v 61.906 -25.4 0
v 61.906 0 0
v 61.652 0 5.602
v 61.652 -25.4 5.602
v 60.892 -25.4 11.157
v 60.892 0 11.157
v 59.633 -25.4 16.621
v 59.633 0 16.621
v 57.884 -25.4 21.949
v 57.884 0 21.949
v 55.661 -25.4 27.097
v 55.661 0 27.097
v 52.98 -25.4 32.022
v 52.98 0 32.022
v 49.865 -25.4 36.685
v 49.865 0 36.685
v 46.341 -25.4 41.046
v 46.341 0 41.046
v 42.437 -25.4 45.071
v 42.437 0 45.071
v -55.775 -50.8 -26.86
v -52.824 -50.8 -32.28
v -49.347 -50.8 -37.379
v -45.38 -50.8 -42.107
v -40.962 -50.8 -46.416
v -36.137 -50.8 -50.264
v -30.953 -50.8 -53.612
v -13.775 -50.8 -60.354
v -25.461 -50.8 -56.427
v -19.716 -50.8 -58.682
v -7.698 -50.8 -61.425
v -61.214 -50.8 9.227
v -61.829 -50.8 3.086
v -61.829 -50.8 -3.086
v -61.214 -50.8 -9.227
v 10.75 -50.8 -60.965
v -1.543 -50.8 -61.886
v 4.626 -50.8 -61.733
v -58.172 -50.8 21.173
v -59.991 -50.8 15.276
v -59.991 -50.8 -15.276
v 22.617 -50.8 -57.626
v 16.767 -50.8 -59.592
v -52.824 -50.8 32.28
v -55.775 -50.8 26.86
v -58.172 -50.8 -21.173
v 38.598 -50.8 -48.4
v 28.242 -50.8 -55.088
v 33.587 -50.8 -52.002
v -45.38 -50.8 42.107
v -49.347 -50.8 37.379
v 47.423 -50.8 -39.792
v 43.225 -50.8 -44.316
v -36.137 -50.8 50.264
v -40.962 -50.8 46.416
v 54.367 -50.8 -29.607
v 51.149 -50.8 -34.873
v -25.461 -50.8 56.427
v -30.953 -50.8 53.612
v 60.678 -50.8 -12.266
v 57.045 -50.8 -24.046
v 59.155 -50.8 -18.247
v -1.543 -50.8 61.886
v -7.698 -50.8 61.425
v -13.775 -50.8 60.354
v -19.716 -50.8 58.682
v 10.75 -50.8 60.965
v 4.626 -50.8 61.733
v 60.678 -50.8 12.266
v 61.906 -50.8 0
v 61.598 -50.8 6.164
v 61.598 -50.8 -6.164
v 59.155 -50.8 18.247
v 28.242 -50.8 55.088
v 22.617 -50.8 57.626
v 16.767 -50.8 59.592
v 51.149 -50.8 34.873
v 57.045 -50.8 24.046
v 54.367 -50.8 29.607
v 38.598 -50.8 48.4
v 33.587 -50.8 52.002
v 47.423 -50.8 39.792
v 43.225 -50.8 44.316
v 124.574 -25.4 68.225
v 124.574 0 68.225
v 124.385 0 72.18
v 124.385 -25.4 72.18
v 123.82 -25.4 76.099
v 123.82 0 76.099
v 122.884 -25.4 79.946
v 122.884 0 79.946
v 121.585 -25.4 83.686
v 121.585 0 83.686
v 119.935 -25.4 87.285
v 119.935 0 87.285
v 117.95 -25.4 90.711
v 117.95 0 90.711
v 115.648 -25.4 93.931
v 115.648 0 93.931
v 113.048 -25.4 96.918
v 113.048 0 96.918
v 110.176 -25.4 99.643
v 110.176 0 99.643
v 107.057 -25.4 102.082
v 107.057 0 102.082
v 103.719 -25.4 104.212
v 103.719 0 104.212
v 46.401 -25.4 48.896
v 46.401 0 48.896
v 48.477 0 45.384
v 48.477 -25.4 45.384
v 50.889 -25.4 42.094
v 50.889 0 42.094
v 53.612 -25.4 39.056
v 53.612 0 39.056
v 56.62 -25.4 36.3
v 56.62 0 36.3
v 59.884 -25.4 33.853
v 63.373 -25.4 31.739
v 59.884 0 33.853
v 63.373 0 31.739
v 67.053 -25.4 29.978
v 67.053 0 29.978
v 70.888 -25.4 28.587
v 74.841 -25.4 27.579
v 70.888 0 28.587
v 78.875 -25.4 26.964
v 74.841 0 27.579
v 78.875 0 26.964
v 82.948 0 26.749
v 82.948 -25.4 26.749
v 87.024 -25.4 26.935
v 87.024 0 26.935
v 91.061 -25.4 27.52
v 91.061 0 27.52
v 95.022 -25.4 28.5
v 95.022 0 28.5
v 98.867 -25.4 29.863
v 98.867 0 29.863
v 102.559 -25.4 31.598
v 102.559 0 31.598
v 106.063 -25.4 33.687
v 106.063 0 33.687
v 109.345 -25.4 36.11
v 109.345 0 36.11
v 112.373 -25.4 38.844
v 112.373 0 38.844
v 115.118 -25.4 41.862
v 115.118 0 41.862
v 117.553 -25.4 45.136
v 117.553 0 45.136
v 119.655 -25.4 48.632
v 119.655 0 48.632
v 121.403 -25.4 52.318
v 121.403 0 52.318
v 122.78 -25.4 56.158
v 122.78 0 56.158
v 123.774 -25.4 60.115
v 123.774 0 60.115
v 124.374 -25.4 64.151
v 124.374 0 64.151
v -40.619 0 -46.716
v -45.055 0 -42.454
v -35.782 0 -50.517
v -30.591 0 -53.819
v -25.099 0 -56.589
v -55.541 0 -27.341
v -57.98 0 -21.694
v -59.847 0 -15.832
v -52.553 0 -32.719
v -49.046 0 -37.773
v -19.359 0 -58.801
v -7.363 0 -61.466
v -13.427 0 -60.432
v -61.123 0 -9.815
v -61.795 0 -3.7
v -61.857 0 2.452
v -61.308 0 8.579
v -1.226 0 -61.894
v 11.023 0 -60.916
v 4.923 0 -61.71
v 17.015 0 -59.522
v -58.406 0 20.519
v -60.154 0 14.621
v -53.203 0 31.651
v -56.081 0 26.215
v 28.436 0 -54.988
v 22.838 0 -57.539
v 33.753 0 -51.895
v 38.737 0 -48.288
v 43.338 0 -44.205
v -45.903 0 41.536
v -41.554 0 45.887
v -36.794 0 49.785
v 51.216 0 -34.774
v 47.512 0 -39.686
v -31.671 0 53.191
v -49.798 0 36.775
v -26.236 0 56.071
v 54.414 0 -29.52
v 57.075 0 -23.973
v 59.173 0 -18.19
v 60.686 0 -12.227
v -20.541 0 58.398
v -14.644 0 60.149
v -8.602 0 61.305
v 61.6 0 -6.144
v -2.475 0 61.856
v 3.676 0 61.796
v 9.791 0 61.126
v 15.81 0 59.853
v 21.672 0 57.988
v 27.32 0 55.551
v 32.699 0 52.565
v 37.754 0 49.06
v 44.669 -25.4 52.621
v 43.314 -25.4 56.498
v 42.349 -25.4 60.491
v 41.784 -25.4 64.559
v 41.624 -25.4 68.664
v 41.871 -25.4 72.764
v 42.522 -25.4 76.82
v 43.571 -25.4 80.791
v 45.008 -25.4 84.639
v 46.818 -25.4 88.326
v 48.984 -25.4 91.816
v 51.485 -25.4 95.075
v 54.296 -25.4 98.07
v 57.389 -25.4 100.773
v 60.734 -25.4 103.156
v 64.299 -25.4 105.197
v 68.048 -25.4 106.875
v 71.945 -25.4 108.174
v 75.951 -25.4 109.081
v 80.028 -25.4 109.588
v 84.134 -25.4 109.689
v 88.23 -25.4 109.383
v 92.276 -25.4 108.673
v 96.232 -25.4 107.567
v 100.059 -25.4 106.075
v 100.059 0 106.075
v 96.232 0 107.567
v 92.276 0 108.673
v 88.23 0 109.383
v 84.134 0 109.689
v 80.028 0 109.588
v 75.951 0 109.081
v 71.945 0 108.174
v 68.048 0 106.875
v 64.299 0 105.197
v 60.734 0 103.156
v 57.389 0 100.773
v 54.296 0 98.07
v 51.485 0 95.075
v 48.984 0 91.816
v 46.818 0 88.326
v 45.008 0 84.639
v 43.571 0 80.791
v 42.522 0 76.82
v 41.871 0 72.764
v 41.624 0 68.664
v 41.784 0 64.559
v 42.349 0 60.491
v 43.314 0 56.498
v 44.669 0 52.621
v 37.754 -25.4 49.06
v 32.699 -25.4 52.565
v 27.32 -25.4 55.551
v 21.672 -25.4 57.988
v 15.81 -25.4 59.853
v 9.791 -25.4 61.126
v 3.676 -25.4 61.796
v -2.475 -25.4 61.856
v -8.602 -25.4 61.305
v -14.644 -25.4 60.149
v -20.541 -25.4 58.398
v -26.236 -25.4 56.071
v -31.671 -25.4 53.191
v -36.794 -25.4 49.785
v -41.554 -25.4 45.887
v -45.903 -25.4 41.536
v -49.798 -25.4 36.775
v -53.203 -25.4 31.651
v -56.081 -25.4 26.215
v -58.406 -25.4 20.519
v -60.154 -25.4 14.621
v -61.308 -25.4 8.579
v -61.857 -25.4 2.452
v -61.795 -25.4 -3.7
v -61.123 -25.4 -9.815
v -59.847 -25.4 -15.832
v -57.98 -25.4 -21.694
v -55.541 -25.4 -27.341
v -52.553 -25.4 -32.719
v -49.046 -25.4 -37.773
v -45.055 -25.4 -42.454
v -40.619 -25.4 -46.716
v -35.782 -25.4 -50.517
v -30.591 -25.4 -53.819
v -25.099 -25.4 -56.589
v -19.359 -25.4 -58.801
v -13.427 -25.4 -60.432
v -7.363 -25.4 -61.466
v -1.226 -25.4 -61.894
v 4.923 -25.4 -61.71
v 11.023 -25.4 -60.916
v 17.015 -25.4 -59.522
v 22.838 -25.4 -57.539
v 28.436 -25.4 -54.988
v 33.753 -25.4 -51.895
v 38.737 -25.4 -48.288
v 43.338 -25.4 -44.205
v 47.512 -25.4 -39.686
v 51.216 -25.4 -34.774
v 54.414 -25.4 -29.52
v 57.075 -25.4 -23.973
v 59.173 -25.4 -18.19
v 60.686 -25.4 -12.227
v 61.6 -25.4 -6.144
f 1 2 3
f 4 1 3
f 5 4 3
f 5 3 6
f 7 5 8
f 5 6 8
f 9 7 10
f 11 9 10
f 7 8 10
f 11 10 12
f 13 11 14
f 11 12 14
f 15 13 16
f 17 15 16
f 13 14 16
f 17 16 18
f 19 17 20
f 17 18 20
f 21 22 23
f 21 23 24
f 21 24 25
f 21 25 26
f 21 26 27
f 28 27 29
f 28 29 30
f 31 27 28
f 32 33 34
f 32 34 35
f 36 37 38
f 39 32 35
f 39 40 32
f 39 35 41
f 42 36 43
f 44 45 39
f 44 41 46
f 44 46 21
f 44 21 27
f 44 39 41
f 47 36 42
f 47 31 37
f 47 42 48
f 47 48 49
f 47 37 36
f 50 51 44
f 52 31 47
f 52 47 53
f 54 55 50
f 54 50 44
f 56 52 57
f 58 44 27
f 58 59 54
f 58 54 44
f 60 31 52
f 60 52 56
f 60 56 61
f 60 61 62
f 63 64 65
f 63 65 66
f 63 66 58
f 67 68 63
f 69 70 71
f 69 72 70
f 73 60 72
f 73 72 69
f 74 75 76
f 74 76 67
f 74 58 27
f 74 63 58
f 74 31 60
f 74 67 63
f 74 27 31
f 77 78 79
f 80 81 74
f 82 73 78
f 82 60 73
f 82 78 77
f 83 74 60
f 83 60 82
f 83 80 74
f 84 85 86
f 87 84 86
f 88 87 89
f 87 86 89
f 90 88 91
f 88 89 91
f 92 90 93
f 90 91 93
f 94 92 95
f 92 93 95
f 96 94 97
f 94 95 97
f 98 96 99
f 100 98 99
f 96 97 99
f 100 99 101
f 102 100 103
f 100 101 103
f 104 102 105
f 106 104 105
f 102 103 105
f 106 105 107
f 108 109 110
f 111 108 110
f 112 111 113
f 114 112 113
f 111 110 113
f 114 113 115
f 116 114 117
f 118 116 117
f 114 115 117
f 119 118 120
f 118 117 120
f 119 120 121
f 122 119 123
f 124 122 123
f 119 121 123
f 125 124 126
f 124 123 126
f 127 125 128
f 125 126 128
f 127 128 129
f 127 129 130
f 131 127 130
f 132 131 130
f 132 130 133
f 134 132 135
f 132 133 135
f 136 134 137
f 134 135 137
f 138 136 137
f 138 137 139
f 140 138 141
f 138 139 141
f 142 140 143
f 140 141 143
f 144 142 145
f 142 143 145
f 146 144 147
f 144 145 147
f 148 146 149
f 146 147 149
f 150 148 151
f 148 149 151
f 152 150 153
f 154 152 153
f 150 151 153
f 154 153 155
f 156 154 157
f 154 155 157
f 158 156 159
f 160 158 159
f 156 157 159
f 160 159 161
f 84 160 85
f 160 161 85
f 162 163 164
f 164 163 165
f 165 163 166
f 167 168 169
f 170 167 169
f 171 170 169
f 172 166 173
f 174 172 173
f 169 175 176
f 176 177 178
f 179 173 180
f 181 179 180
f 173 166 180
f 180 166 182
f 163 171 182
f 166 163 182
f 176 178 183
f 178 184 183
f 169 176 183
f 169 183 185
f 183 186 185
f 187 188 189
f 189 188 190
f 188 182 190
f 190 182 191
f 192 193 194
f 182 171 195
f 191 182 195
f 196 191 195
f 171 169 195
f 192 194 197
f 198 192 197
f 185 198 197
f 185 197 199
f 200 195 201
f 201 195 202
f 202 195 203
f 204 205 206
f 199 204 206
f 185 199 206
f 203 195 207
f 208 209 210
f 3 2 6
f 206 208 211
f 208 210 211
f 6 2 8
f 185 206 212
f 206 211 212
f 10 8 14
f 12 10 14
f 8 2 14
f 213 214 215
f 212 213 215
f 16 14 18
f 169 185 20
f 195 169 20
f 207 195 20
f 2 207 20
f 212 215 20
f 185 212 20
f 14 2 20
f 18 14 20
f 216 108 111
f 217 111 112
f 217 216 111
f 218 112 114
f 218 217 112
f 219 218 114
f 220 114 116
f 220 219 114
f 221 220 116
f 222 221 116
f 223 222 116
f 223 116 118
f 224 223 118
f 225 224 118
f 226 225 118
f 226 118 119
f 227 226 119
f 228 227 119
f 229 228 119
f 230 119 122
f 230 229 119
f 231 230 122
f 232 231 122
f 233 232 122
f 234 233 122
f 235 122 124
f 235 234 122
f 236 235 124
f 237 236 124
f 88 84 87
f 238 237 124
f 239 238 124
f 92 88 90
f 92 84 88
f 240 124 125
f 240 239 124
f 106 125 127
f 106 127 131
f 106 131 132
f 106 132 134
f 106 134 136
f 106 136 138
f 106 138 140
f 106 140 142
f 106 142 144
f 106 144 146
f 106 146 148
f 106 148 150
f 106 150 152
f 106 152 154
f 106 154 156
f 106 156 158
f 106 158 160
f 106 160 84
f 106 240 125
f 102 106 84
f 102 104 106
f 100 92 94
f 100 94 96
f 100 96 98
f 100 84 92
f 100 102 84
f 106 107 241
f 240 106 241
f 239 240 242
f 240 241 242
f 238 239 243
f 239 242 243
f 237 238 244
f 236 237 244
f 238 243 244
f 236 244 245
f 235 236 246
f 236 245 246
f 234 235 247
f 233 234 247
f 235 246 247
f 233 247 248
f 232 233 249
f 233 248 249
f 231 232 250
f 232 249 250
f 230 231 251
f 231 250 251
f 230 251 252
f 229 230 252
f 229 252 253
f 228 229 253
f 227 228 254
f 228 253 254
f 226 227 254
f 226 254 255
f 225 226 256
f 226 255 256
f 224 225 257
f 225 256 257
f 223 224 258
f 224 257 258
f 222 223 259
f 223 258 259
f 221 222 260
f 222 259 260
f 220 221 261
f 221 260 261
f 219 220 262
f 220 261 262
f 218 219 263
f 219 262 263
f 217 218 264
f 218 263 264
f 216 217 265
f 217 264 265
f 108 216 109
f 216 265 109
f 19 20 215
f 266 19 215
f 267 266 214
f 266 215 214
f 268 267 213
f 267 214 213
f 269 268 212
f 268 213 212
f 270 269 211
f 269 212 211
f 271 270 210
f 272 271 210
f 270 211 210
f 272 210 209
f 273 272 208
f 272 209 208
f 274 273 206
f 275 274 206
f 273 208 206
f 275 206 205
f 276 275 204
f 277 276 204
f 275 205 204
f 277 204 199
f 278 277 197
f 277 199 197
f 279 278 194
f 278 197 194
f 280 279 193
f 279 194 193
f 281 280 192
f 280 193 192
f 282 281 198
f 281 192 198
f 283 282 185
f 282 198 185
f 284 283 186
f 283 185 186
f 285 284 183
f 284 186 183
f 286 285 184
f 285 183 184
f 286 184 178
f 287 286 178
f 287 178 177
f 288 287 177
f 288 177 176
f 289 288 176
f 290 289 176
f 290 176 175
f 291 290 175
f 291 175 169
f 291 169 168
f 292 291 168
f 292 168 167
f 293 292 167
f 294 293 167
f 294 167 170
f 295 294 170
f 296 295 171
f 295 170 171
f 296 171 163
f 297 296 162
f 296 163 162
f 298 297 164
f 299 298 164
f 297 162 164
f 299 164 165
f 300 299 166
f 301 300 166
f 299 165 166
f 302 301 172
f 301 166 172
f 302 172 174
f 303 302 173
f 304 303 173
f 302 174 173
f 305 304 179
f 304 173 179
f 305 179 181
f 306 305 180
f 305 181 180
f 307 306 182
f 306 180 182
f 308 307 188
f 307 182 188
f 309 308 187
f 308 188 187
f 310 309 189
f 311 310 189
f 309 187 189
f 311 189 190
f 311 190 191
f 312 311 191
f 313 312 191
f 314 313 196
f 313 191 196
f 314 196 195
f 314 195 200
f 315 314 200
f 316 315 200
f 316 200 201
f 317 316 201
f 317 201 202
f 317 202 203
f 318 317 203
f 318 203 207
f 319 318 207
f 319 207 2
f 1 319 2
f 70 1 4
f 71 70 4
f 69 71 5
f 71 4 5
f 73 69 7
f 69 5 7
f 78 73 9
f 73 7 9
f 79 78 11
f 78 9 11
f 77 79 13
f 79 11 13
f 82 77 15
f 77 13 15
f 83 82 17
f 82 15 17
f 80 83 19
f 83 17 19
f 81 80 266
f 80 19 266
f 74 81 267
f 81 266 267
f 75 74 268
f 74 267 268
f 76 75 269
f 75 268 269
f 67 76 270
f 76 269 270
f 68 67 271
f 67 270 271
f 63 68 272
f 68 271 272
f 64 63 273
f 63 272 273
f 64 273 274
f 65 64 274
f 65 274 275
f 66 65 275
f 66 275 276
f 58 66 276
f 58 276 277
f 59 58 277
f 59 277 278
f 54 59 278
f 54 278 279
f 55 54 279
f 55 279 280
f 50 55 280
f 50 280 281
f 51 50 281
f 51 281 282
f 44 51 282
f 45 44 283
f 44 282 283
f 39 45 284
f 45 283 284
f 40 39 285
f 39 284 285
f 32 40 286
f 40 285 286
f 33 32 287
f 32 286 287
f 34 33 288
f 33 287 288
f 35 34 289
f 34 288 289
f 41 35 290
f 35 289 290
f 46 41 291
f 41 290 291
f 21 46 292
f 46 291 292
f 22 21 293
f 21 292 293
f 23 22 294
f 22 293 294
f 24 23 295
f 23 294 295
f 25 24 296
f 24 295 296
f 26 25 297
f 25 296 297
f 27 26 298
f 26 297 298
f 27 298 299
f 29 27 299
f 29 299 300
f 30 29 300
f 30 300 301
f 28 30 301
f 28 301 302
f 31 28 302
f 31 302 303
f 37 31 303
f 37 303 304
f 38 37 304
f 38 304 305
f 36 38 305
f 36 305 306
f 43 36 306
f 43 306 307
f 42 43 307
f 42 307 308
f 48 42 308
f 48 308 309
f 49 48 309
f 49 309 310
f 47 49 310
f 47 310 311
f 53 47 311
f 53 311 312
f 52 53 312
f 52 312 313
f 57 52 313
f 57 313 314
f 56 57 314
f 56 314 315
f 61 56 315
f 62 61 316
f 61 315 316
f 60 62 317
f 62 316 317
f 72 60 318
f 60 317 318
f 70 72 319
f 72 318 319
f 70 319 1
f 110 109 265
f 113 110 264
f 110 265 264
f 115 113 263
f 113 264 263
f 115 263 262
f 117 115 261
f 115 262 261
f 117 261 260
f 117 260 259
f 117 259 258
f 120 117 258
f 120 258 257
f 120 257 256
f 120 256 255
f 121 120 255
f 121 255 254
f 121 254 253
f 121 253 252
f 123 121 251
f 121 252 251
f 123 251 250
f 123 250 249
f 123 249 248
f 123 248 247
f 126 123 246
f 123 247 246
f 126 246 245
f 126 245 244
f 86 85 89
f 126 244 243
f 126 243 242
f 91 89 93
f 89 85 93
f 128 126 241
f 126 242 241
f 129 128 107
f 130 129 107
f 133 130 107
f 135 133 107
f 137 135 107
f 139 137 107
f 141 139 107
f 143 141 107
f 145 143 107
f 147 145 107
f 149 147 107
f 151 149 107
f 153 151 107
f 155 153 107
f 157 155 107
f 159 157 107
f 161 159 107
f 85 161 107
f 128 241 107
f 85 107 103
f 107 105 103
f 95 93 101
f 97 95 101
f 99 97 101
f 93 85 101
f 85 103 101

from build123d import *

# Parameters (mm, degrees)
F1_DEPTH  = 25.4
F1_FACE_R = 61.905723
F2_DEPTH  = 25.4


with BuildPart() as f1:
    # F0 (on Front) → F1 (new body)
    with BuildSketch(Plane.XZ):
        with BuildLine():
            ThreePointArc((42.437269, 45.071019), (-56.830575, -24.548001), (61.905723, 0))
            ThreePointArc((61.905723, 0), (56.830575, 24.548001), (42.437269, 45.071019))
        make_face()
        with BuildLine():
            ThreePointArc((103.719492, 104.211882), (54.295645, 98.070268), (46.400763, 48.896018))
            Line((46.400763, 48.896018), (103.719492, 104.211882))
        make_face()
        with BuildLine():
            Line((103.719492, 104.211882), (46.400763, 48.896018))
            ThreePointArc((46.400763, 48.896018), (93.053484, 27.961368), (124.574243, 68.22522))
            ThreePointArc((124.574243, 68.22522), (118.983798, 89.021617), (103.719492, 104.211882))
        make_face()
    extrude(amount=F1_DEPTH)

    # F1_face (on face) → F2 (join)
    with BuildSketch(Plane.XZ.offset(25.4)):
        Circle(F1_FACE_R)
    extrude(amount=F2_DEPTH)


solid = f1.part
